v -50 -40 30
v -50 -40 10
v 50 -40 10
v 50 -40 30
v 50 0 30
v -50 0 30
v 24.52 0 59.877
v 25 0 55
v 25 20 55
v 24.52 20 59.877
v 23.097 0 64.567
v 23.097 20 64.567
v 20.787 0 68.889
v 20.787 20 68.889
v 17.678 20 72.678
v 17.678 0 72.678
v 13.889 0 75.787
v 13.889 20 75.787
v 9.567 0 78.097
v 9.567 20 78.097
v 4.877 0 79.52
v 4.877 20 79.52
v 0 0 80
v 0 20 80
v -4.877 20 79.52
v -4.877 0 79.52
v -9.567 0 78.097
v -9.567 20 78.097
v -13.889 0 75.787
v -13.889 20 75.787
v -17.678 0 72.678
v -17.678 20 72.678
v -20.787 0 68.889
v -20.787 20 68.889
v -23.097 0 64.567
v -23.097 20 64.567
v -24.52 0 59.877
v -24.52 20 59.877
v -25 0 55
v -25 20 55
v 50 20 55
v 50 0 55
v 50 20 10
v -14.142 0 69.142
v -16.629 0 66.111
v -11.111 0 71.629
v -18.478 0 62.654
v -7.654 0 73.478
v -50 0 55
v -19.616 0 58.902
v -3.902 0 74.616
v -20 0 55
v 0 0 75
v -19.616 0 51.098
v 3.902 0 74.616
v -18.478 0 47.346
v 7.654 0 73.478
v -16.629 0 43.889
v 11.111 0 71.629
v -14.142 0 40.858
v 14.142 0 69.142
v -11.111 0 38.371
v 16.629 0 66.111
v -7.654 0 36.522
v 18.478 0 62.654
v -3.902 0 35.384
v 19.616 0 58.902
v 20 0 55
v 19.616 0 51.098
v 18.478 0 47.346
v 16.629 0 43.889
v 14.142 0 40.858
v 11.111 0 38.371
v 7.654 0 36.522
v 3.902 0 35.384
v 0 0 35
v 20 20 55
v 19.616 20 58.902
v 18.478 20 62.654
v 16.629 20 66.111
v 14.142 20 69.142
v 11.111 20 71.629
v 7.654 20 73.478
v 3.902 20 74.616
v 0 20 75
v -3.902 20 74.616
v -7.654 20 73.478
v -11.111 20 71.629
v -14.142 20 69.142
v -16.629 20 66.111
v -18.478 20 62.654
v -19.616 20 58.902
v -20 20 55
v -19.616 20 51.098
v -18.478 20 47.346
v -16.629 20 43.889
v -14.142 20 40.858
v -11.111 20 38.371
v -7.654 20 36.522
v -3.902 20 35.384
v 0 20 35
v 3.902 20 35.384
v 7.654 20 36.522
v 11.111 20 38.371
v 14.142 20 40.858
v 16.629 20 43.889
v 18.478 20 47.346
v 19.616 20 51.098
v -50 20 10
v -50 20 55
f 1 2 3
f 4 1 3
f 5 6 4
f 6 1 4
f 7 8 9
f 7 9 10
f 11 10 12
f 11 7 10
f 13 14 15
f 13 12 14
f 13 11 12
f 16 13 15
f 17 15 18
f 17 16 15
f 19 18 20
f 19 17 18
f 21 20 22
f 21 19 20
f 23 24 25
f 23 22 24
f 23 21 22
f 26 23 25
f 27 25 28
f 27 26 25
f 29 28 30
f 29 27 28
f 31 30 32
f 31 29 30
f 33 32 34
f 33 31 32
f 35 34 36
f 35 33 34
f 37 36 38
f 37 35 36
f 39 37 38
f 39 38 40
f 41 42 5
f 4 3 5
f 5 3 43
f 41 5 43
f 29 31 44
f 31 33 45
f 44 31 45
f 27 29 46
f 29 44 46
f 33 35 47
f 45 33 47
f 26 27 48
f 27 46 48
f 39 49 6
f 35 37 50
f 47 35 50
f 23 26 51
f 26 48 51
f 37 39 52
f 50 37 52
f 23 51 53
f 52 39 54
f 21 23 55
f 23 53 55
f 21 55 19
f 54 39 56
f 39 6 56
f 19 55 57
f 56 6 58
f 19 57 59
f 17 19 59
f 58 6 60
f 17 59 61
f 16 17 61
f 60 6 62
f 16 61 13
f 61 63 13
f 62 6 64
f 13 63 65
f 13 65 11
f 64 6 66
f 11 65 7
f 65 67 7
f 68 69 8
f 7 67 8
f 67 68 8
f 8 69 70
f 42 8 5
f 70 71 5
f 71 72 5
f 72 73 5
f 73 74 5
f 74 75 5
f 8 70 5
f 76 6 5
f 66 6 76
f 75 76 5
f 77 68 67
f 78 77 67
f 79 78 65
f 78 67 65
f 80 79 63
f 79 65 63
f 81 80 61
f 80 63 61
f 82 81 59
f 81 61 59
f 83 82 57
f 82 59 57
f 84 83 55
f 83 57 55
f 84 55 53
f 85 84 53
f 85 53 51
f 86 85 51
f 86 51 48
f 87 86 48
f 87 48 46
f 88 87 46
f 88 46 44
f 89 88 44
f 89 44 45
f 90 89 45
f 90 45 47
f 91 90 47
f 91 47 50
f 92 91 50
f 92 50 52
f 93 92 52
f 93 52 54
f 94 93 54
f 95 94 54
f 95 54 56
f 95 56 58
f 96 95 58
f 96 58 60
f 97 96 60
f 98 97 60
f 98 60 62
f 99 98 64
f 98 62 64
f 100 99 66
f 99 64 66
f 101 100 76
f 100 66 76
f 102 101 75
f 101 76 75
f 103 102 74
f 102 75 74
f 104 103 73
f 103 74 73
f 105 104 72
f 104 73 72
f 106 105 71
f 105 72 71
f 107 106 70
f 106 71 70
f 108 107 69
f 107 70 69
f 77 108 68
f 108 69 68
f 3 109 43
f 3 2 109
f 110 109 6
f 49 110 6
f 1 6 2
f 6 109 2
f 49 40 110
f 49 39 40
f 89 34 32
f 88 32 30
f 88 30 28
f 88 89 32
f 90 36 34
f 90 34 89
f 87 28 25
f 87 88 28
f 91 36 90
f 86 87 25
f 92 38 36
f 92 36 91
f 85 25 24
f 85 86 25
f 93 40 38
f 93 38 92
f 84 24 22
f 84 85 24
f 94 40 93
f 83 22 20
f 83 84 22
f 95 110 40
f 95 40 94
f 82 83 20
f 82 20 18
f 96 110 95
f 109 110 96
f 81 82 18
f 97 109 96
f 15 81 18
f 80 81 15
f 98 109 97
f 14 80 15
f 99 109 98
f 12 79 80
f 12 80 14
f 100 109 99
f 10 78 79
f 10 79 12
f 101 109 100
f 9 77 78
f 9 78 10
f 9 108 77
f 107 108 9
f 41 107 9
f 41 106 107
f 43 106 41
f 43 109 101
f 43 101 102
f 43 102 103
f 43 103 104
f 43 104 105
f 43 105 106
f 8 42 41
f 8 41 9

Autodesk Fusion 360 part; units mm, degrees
sketch "Sketch1" plane through (0, 0, 0) normal (0, 1, 0) x (1, 0, 0)
  line L0 (-50, -10) -> (50, -10)
  line L1 (50, -10) -> (50, -55)
  line L2 (50, -55) -> (-50, -55)
  line L3 (-50, -55) -> (-50, -10)
  circle A0 centre (0, -55) radius 20
  circle A1 centre (0, -55) radius 25
  dimension "d1" = 100
  dimension "d2" = 45
  dimension "d4" = 50
extrude "Extrude1" add sketch "Sketch1" along normal blind 20 contours L0 L1 L2 L3 A1 | L2 A0 A1 | L2 A0 A1
sketch "Sketch2" plane through (0, 0, 10) normal (0, 0, -1) x (1, 0, 0)
  line L0 (50, 0) -> (-50, 0)
  line L1 (-50, 0) -> (-50, -20)
  line L2 (-50, -20) -> (50, -20)
  line L3 (50, -20) -> (50, 0)
  line L4 (-50, 0) -> (-50, 40)
  line L5 (-50, 40) -> (50, 40)
  line L6 (50, 40) -> (50, 0)
  dimension "d7" = 40
extrude "Extrude2" add sketch "Sketch2" against normal blind 20 contours L0 L4 L5 L6
